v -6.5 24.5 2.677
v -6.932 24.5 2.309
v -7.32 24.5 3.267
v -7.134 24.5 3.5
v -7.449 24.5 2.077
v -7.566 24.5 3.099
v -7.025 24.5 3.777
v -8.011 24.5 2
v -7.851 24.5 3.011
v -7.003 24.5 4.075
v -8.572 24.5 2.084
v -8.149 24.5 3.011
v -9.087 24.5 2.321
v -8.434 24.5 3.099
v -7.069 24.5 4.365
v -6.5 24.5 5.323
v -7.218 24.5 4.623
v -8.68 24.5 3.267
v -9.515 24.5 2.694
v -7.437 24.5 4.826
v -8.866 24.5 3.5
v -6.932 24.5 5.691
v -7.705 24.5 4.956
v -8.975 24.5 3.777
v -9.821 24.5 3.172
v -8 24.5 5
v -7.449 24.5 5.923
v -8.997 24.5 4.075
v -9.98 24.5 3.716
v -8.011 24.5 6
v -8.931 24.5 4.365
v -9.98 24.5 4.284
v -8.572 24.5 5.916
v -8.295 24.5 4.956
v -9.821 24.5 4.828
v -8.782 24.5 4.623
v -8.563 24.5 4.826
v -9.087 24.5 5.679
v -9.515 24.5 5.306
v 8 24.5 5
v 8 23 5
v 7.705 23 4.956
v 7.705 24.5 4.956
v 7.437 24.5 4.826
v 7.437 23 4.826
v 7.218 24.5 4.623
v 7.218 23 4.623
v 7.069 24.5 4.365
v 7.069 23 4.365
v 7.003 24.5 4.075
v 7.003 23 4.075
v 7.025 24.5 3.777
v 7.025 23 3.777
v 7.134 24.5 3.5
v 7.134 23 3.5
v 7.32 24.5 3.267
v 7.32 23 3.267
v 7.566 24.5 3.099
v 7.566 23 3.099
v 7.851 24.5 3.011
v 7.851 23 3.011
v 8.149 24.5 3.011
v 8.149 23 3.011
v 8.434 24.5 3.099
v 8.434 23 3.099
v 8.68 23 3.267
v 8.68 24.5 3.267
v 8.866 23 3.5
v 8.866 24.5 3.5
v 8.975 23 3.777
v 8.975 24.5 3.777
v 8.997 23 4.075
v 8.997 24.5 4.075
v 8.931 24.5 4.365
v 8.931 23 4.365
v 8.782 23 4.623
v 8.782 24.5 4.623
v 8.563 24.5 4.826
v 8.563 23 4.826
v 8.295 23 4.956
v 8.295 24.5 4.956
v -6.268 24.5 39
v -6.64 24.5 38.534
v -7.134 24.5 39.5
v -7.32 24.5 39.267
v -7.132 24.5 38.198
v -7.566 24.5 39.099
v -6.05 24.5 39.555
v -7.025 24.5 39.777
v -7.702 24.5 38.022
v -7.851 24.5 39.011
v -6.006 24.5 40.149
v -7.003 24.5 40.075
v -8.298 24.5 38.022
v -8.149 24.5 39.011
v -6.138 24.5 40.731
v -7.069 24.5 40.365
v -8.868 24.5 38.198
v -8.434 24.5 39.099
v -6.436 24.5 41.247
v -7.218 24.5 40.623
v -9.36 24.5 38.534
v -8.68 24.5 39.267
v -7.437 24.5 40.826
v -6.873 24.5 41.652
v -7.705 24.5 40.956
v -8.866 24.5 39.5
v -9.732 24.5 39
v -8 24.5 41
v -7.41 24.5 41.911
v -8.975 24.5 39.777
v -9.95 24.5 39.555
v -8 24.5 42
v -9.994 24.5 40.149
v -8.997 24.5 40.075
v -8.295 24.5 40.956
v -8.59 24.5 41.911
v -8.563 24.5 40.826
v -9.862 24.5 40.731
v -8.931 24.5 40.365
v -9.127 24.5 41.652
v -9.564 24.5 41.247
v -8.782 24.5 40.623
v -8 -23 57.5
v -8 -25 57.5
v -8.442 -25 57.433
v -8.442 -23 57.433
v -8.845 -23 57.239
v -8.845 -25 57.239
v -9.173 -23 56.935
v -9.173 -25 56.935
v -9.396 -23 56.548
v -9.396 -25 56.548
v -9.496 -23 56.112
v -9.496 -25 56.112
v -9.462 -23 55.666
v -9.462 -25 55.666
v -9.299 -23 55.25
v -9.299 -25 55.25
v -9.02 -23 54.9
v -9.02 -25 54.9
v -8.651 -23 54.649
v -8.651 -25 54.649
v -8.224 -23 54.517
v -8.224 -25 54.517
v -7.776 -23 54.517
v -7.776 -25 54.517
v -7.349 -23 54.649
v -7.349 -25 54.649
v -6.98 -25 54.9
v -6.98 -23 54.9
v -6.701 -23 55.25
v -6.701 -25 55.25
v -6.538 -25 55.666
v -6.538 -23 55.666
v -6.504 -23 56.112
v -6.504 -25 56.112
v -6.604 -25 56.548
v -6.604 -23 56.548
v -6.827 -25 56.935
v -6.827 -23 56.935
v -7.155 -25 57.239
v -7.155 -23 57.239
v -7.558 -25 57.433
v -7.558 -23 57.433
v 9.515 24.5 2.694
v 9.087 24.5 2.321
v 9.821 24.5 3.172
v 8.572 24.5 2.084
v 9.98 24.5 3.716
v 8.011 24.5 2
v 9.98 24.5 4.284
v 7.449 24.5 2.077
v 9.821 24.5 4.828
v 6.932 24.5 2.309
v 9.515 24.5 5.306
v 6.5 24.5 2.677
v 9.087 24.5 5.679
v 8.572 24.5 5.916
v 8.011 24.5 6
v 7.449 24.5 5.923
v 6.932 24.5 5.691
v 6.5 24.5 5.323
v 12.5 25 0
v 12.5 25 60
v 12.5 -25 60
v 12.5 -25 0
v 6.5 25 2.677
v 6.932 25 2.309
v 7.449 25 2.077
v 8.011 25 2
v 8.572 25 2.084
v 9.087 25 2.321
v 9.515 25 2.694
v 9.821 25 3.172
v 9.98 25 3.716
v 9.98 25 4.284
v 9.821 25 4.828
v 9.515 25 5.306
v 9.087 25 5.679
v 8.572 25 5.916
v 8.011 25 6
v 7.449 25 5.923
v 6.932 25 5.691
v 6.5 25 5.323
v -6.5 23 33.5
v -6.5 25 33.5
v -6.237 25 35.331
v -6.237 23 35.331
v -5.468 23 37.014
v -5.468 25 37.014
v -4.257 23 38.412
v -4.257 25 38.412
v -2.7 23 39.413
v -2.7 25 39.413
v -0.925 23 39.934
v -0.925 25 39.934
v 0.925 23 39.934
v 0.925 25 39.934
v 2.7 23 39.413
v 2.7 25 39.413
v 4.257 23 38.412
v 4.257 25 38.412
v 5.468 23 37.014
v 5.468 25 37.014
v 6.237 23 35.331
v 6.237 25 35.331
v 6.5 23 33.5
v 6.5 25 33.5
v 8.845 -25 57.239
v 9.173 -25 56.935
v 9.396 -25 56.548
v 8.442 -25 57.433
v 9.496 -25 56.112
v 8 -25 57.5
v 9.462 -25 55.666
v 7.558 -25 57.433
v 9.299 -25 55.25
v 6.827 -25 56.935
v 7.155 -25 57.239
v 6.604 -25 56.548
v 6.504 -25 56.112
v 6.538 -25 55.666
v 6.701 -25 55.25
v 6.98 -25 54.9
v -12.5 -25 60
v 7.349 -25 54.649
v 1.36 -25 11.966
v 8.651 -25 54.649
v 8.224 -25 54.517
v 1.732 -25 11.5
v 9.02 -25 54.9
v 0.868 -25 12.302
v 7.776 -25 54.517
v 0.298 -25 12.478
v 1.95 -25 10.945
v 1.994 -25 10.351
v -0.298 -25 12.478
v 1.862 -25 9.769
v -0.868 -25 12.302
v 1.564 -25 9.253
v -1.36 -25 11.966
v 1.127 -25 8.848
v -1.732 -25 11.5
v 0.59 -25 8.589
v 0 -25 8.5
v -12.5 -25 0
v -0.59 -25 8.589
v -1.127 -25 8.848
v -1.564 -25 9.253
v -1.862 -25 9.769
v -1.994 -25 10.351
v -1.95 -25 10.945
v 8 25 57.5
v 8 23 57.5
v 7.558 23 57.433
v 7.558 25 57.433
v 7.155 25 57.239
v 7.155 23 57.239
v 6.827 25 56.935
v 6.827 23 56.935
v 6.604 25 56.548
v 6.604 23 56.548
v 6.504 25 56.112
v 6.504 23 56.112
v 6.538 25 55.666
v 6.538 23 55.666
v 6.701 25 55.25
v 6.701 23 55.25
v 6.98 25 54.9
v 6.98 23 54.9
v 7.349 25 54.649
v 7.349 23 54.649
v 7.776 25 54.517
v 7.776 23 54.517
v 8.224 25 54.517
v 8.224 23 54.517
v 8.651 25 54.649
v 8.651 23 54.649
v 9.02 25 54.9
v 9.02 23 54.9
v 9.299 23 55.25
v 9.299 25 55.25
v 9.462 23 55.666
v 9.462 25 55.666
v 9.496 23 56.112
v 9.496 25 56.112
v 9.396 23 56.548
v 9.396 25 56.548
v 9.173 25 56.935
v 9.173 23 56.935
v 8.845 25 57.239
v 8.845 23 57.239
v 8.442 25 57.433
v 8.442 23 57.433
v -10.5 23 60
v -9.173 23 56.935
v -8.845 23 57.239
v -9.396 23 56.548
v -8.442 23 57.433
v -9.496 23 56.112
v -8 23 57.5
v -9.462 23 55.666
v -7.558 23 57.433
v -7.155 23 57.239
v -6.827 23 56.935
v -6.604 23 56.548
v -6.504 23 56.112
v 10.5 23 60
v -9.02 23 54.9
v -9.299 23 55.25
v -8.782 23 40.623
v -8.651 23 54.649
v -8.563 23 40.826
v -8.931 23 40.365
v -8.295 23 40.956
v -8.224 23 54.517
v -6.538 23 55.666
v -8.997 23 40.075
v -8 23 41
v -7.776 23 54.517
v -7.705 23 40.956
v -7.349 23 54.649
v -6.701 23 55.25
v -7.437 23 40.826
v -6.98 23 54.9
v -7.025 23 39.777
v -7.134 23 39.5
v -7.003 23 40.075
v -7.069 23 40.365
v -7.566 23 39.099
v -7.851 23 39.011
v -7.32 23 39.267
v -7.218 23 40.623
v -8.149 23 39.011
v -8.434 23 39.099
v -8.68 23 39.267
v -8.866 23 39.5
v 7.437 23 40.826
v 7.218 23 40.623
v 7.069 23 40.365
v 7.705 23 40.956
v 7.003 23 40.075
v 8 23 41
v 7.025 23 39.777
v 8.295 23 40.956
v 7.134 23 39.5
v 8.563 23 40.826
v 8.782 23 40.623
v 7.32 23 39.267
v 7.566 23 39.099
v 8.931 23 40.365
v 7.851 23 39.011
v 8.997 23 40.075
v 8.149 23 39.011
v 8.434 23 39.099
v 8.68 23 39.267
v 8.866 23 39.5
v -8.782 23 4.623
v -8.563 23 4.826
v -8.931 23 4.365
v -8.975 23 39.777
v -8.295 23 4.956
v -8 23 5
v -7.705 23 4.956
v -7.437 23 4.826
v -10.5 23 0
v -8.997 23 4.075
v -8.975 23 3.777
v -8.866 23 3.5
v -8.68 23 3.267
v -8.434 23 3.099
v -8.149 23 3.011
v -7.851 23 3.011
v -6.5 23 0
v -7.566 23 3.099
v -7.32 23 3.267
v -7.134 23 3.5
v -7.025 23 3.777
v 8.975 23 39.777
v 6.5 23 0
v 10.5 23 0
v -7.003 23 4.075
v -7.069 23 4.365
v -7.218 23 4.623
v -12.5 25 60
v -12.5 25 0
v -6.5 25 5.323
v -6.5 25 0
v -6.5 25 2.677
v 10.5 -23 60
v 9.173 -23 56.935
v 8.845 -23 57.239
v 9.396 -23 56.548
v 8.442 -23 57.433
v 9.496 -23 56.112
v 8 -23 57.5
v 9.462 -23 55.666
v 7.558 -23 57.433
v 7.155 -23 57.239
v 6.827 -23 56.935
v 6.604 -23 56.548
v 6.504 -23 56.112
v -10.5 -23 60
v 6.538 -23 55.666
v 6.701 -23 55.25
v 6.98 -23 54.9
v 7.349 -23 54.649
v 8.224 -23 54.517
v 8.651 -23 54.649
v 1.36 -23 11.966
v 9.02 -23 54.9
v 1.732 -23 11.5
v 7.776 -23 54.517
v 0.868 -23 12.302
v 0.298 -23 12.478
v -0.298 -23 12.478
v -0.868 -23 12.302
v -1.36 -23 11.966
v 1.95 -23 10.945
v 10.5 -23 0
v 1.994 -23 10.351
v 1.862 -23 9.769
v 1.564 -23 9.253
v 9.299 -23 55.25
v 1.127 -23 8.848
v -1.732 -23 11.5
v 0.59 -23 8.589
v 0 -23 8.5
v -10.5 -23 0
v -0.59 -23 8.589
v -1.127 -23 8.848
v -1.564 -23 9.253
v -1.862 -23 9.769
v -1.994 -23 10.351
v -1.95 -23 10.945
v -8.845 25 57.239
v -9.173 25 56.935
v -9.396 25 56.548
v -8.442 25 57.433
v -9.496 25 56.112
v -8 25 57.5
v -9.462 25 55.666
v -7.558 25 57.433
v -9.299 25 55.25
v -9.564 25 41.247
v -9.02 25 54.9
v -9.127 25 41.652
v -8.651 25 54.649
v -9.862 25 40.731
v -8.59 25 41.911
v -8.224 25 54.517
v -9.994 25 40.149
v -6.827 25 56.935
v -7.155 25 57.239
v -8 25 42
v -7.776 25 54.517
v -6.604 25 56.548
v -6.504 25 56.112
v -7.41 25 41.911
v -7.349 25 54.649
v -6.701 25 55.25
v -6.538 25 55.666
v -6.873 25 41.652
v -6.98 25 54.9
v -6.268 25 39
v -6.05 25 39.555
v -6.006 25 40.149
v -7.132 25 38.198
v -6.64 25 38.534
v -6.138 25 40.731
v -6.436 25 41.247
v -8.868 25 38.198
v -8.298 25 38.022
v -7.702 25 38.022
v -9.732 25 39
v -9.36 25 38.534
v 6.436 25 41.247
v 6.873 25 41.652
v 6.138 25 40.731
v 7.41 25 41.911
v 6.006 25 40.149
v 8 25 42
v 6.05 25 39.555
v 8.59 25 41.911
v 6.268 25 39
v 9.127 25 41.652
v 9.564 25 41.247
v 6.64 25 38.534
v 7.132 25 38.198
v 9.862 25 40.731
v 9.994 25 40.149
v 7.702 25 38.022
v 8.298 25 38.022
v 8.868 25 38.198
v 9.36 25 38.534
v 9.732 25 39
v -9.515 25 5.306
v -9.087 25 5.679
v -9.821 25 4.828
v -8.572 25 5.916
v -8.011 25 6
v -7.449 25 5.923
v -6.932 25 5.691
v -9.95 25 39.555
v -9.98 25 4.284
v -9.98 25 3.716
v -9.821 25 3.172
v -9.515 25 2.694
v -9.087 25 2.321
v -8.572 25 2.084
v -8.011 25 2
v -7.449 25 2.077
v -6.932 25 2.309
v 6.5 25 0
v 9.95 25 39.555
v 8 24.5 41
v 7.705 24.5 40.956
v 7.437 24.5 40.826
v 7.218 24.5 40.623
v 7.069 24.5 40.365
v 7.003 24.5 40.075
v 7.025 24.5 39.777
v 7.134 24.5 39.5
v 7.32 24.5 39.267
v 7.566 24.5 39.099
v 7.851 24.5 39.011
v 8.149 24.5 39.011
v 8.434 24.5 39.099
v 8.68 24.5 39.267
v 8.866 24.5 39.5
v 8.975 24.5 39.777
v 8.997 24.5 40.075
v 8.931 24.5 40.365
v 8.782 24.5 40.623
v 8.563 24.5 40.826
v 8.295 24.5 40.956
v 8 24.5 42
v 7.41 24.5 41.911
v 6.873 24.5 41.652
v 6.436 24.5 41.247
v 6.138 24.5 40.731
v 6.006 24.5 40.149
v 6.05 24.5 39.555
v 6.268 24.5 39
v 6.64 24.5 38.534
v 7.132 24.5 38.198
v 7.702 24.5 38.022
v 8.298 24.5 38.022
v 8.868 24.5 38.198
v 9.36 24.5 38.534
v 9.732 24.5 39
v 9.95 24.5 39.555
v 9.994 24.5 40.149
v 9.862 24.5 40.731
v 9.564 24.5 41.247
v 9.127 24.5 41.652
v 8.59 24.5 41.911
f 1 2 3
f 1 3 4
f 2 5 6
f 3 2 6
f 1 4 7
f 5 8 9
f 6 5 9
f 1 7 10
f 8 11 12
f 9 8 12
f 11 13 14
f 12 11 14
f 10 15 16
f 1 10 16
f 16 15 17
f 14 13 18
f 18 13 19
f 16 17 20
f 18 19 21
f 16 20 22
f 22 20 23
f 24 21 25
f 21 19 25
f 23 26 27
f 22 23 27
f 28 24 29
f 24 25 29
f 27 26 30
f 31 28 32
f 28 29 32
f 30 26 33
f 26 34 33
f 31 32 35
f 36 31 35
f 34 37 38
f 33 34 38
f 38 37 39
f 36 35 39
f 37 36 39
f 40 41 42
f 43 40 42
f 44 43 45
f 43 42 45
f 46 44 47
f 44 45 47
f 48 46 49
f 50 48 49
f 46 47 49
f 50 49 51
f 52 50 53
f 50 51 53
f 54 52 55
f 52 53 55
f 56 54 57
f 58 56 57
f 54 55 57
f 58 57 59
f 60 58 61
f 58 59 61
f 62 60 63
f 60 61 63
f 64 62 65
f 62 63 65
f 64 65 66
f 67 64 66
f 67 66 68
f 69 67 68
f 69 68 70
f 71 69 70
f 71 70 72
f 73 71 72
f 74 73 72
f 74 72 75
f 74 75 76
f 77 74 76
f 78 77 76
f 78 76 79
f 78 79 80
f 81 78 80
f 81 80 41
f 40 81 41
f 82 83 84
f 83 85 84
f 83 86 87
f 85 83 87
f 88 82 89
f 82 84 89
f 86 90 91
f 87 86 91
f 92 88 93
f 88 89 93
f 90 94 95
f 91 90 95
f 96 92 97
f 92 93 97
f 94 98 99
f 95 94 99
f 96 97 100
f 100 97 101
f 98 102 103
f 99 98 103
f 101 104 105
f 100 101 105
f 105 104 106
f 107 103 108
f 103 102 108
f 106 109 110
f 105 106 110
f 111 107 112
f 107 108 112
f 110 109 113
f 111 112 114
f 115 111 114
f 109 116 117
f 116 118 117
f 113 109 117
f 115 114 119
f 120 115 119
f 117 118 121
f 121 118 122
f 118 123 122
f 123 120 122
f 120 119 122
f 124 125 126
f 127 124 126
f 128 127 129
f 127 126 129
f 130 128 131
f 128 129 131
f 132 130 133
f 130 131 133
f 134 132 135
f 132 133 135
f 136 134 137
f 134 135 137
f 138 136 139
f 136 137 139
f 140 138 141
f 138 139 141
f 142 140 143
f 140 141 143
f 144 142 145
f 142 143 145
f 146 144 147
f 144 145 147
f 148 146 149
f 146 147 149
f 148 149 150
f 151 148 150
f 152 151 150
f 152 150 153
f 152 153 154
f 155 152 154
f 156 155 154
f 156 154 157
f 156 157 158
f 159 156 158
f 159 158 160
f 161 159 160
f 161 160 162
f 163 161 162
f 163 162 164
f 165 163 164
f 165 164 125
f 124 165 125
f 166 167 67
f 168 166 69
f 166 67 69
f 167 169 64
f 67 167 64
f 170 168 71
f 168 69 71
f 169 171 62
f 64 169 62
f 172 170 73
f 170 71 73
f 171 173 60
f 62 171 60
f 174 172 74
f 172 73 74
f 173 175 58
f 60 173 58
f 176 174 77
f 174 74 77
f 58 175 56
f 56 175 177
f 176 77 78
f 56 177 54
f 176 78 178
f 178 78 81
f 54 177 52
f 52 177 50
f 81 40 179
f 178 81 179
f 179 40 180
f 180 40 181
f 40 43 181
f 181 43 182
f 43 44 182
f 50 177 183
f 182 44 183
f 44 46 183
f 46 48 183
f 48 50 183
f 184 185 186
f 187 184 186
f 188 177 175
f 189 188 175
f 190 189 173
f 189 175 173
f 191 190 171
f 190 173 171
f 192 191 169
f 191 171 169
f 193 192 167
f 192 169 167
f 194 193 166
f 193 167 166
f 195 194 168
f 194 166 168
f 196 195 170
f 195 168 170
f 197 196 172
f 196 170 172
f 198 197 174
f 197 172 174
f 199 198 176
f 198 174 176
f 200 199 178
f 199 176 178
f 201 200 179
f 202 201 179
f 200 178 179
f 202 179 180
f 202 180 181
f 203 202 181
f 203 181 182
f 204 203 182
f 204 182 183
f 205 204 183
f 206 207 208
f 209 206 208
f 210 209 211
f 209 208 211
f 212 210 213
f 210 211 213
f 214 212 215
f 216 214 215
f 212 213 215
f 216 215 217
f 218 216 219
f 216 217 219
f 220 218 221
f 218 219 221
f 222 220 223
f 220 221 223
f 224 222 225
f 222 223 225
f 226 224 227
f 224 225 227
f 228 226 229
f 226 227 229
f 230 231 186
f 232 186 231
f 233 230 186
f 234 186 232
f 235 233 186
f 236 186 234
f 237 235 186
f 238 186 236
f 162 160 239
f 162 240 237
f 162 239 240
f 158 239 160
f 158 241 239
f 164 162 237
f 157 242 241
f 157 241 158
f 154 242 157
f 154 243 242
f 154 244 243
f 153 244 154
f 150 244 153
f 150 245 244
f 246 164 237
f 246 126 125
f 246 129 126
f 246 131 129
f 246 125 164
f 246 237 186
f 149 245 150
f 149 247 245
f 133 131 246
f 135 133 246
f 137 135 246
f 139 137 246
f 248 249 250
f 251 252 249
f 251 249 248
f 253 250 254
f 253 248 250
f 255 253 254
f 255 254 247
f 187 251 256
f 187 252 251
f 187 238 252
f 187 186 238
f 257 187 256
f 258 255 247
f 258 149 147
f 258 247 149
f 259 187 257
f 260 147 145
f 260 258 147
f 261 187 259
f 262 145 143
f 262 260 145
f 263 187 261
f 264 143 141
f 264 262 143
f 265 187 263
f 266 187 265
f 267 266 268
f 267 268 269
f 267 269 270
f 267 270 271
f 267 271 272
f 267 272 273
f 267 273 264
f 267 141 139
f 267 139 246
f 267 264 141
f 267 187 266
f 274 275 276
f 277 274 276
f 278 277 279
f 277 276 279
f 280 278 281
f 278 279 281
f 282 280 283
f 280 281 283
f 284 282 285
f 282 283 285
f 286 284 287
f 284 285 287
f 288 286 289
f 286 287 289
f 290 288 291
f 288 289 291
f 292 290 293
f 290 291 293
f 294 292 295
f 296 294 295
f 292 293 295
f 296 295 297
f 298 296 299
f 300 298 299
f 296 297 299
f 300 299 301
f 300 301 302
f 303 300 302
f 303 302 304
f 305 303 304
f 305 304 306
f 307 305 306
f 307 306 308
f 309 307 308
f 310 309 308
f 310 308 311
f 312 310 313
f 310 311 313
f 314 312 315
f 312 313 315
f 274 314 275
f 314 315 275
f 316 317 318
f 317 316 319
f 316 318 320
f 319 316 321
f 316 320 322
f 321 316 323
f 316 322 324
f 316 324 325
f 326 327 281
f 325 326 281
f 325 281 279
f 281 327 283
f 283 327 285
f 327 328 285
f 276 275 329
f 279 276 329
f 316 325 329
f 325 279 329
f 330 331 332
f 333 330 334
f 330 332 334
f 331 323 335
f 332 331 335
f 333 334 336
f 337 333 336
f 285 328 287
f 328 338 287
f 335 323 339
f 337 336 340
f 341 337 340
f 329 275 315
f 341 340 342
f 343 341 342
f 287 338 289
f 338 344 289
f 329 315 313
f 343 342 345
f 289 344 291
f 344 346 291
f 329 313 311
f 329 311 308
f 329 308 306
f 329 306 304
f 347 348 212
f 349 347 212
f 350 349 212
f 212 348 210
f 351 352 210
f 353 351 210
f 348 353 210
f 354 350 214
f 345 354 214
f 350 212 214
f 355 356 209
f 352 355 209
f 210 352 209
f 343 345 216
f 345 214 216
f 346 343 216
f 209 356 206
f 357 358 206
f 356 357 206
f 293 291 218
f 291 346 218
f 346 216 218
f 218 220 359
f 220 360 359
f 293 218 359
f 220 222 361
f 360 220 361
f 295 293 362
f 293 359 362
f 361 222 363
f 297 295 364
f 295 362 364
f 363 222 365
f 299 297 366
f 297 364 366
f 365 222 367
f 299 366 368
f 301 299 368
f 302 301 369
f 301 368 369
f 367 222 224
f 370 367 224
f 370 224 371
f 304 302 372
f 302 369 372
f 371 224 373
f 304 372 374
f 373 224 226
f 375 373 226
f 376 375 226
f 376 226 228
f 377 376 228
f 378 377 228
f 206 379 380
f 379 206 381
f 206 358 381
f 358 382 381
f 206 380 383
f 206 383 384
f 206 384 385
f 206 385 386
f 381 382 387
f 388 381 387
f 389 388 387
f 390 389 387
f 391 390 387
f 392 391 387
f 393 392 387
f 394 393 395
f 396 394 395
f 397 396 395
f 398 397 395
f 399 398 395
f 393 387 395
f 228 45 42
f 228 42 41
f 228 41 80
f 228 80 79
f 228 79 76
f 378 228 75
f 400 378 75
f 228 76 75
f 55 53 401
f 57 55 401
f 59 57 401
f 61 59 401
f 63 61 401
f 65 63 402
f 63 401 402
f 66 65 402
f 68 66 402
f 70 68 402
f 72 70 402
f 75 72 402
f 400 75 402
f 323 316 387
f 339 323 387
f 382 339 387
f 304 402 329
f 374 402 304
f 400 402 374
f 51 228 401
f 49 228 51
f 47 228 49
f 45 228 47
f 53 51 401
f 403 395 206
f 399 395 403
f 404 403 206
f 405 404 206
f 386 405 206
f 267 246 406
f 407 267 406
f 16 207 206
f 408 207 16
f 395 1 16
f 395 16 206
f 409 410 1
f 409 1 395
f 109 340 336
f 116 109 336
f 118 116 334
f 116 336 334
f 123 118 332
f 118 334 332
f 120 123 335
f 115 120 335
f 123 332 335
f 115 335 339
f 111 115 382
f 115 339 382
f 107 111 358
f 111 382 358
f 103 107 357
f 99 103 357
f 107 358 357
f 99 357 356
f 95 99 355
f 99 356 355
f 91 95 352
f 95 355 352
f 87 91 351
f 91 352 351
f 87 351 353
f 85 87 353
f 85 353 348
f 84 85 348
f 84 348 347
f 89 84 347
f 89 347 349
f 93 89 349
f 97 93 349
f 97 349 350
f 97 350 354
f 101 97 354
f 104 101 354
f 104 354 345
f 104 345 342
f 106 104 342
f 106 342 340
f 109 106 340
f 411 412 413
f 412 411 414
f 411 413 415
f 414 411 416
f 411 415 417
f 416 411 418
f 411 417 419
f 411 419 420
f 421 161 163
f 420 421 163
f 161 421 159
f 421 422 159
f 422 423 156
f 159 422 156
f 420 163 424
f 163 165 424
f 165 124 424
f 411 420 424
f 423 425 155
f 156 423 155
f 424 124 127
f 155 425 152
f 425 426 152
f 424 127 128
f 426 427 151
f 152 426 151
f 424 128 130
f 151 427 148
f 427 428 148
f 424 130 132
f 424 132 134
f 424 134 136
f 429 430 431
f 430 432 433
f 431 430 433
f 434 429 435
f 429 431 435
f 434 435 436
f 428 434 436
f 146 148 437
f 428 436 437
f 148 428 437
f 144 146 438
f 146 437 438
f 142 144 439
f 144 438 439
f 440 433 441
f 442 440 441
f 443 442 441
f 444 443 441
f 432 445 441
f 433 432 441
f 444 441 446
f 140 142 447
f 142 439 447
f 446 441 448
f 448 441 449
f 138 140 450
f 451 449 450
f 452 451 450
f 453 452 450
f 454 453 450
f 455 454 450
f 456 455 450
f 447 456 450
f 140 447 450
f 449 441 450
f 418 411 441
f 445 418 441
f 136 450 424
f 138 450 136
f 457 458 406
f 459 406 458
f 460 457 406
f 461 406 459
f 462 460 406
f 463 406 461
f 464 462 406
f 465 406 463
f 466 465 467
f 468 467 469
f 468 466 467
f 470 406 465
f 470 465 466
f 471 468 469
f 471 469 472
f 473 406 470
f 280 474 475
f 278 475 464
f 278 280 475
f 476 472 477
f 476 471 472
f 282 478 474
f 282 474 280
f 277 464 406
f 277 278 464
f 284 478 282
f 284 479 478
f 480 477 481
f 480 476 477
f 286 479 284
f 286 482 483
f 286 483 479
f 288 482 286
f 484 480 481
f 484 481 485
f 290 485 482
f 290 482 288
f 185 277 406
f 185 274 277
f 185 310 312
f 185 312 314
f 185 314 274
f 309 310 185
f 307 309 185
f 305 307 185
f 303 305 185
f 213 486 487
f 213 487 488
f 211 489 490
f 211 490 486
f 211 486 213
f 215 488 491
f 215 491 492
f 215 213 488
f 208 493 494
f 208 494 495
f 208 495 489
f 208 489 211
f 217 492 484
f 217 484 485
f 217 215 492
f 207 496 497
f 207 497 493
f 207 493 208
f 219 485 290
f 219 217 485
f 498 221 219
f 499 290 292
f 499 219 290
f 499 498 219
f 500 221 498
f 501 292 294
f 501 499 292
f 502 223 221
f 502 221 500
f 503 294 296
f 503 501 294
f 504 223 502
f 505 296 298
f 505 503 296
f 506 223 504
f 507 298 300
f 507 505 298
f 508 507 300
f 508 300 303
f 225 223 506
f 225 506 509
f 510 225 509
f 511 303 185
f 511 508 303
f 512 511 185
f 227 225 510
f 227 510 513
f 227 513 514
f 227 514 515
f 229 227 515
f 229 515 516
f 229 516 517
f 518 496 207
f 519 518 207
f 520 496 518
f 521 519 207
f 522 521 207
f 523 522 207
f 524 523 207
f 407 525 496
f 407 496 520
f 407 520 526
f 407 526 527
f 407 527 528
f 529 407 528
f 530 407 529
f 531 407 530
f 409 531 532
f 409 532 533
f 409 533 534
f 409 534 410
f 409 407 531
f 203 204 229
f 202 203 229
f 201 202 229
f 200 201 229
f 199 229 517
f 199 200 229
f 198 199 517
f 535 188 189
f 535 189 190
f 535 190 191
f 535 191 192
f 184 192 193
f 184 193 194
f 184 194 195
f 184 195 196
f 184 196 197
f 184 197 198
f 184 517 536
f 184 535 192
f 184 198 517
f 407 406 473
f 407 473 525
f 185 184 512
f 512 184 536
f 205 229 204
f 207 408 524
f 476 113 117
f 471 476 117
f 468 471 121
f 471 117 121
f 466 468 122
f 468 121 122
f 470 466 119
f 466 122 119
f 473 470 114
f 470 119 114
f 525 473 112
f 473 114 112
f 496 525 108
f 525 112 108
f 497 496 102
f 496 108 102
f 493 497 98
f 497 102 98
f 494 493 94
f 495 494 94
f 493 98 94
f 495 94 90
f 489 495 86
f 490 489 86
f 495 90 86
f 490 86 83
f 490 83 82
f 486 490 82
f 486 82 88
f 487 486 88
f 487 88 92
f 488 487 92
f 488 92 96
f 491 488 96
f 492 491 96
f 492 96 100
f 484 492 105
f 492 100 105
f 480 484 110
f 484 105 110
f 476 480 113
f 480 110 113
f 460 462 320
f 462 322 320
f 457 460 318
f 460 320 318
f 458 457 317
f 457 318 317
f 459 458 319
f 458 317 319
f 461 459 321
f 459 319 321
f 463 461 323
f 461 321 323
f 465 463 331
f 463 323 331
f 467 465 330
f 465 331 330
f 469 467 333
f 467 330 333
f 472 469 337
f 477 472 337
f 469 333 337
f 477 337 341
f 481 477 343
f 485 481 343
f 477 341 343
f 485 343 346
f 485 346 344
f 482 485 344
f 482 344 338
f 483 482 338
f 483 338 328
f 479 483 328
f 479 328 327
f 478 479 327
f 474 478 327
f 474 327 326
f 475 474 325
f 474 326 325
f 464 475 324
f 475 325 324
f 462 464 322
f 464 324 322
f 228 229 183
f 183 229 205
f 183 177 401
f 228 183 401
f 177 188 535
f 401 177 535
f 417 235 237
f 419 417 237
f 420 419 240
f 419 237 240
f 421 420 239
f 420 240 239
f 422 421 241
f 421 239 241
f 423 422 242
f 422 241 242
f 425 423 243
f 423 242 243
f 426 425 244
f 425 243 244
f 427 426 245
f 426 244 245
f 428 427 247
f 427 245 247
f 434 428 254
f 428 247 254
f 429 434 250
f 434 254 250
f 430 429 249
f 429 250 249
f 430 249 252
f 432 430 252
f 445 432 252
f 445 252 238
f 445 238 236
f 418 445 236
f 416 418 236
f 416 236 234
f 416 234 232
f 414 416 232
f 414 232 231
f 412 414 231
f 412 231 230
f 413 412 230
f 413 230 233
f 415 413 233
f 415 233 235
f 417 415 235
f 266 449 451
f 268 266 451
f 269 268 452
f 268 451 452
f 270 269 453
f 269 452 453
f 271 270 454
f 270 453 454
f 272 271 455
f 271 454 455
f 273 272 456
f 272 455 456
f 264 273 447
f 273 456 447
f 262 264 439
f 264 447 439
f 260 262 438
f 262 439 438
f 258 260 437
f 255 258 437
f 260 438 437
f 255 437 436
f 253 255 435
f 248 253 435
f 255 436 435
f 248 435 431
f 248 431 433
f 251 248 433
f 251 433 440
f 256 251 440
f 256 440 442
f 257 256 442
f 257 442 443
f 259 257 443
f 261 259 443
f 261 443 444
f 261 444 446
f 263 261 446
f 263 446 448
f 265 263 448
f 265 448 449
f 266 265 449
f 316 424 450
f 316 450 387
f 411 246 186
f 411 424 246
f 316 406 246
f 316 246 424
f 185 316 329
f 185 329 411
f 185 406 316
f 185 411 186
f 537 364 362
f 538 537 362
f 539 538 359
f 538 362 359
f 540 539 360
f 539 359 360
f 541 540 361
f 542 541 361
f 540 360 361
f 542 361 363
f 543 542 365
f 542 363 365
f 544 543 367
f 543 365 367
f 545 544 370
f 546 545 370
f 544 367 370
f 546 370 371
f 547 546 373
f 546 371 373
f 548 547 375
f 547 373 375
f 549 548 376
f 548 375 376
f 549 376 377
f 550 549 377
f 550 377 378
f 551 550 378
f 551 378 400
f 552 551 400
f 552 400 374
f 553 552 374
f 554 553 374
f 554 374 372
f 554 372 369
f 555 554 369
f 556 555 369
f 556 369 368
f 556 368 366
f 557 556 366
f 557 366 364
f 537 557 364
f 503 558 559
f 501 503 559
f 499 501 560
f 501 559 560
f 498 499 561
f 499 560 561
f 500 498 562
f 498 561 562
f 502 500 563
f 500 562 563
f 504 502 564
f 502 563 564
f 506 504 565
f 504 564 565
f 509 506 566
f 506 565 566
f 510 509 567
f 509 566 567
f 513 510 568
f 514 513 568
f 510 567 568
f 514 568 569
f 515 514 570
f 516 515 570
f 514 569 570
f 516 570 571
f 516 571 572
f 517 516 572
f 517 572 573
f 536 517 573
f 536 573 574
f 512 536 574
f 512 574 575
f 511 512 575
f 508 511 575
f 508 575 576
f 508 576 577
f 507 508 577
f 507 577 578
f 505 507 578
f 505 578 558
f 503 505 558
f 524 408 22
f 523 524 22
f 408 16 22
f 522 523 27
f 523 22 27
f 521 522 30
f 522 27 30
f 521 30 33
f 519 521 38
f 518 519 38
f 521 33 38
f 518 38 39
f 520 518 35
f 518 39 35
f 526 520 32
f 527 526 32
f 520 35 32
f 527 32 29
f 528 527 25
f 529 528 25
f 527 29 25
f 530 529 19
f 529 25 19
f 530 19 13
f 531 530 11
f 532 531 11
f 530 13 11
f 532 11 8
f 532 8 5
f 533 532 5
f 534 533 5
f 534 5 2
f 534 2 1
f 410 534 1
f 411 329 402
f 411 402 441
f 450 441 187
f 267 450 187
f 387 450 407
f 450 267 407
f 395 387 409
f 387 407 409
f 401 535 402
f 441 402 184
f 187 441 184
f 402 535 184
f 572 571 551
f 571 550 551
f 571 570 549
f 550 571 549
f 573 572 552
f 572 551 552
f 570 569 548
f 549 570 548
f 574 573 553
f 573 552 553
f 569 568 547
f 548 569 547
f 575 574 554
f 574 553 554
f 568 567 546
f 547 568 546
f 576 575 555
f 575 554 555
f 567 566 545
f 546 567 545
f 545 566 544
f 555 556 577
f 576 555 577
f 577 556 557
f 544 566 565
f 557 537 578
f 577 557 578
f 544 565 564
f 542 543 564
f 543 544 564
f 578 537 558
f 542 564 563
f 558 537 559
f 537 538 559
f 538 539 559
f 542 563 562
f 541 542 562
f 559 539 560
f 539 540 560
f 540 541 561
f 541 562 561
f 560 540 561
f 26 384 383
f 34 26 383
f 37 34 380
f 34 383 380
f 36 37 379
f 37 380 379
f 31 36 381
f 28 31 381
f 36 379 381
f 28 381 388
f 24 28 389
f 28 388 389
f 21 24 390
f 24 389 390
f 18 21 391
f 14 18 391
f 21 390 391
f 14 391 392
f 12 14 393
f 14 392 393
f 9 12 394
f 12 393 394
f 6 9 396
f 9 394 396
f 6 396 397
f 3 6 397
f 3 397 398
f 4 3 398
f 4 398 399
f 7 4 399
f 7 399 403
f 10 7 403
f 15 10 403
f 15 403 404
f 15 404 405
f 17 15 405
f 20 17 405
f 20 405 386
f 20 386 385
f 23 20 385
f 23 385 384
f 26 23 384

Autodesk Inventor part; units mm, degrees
ref_plane "YZ Plane" through (0, 0, 0) normal (1, 0, 0) x (0, 1, 0)
ref_plane "XZ Plane" through (0, 0, 0) normal (0, 1, 0) x (-1, 0, 0)
ref_plane "XY Plane" through (0, 0, 0) normal (0, 0, 1) x (1, 0, 0)
sketch "スケッチ1" plane through (0, 0, 0) normal (0, 0, 1) x (1, 0, 0)
  line L0 (-12.5, 25) -> (12.5, 25)
  line L1 (12.5, 25) -> (12.5, -25)
  line L2 (12.5, -25) -> (-12.5, -25)
  line L3 (-12.5, -25) -> (-12.5, 25)
  line L4 (-10.5, 23) -> (10.5, 23)
  line L5 (10.5, 23) -> (10.5, -23)
  line L6 (10.5, -23) -> (-10.5, -23)
  line L7 (-10.5, -23) -> (-10.5, 23)
  point P0 (0, 0)
  dimension "d0" = 25
  dimension "d1" = 50
  dimension "d2" = 46
  dimension "d3" = 21
  dimension "d4" = 25
  dimension "d5" = 23
  dimension "d6" = 10.5
  dimension "d7" = 12.5
extrude "押し出し1" add sketch "スケッチ1" along normal blind 60
sketch "スケッチ2" plane through (-12.5, 25, 0) normal (0, 1, 0) x (1, 0, 0)
  line L0 (0, 0) -> (25, 0) projected
  line L1 (0, 0) -> (0, -60) projected
  arc A0 (6, -33.5) -> (19, -33.5) centre (12.5, -33.5) ccw
  line L2 (6, -33.5) -> (6, 0)
  line L3 (19, -33.5) -> (19, 0)
  point P0 (12.5, 0)
  dimension "d10" = 13
  dimension "d11" = 33.5
  dimension "d12" = 12.5
extrude "押し出し2" cut sketch "スケッチ2" against normal blind 2
sketch "スケッチ3" plane through (-12.5, 25, 60) normal (0, 1, 0) x (1, 0, 0)
  arc A0 (6, 26.5) -> (19, 26.5) centre (12.5, 26.5) ccw projected
  circle A1 centre (4.5, 20) radius 1
  circle A2 centre (4.5, 56) radius 1
  circle A3 centre (20.5, 56) radius 1
  circle A4 centre (20.5, 20) radius 1
  point P0 (12.5, 60)
  dimension "d15" = 6.5
  dimension "d16" = 6.5
  dimension "d17" = 2
  dimension "d18" = 8
  dimension "d19" = 8
  dimension "d20" = 8
  dimension "d21" = 8
  dimension "d22" = 29.5
  dimension "d23" = 29.5
hole "穴1" at (-8, 25, 4) at (8, 25, 4) at (8, 25, 40) at (-8, 25, 40) direction (0, -1, 0) diameter 2 depth 2 tip angle 118 counterbore diameter 4 counterbore depth 0.5
sketch "スケッチ4" plane through (-12.5, -25, 0) normal (0, -1, 0) x (1, 0, 0)
  line L0 (25, 0) -> (0, 0) projected
  line L1 (25, 0) -> (25, 60) projected
  circle A0 centre (12.5, 10.5) radius 2
  point P0 (12.5, 0)
  dimension "d31" = 4
  dimension "d32" = 12.5
  dimension "d33" = 10.5
hole "穴2" at (0, -25, 10.5) direction (0, 1, 0) diameter 4 end through all
sketch "スケッチ5" plane through (-12.5, 25, 60) normal (0, 1, 0) x (1, 0, 0)
  line L0 (0, 0) -> (25, 0) projected
  arc A0 (6, 26.5) -> (19, 26.5) centre (12.5, 26.5) ccw projected
  circle A1 centre (20.5, 4) radius 1.5
  circle A2 centre (4.5, 4) radius 1.5
  point P0 (12.5, 60)
  dimension "d43" = 4
  dimension "d44" = 4
  dimension "d46" = 8
  dimension "d47" = 8
  dimension "d57" = 3
hole "穴4" at (-8, 25, 56) at (8, 25, 56) direction (0, -1, 0) diameter 3 end through all
thread "ねじ1" size "M3x0.5" class "6H" standard "ANSI Metric M Profile" full length
thread "ねじ2" size "M3x0.5" class "6H" standard "ANSI Metric M Profile" full length
thread "ねじ3" size "M3x0.5" class "6H" standard "ANSI Metric M Profile" full length
thread "ねじ4" size "M3x0.5" class "6H" standard "ANSI Metric M Profile" full length
properties part number "10" material "アルミニウム 6061"
